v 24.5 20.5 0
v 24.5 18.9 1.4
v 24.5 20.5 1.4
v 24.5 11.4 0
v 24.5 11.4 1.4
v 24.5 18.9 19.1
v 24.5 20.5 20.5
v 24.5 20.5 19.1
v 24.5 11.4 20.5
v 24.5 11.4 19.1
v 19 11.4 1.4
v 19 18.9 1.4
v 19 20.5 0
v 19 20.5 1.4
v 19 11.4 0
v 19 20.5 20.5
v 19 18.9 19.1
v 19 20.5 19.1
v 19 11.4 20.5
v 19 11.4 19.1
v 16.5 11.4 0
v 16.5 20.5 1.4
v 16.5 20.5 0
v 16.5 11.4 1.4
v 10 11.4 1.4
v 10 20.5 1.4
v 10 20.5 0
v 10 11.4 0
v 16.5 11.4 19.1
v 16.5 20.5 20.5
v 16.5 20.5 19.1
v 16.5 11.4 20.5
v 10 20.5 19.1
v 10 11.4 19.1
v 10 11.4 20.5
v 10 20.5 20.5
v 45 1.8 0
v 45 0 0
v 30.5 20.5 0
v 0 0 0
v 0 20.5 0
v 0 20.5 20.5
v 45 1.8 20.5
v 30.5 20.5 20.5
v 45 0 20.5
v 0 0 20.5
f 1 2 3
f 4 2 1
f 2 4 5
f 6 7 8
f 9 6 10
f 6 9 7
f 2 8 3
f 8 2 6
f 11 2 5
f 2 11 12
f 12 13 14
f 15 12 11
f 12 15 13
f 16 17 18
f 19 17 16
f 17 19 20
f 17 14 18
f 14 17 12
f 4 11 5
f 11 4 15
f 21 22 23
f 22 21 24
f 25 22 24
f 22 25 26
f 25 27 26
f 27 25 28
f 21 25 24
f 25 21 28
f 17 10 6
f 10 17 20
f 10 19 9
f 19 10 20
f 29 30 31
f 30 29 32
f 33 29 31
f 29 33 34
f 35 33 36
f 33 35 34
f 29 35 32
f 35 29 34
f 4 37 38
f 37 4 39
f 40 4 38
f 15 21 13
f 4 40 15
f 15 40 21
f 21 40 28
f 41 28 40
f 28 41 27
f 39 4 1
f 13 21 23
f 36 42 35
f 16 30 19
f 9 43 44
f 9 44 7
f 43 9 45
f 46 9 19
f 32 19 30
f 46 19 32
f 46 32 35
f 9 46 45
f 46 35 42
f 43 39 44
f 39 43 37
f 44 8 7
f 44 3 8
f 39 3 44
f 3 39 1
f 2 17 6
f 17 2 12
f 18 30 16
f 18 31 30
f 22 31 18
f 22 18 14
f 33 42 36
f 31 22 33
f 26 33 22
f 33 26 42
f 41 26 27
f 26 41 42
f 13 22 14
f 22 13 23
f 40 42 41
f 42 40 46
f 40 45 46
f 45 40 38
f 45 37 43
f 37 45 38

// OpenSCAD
length = [45,30.5];
width = 20.5;
height = 20.5;
rippe=[6,5.5,1.5,9.2];//dx von vorne, breite Rille dx, breite Rille dy
rippe2=[20.5,6.5,1.5,9.2];//dx von vorne, breite Rille dx, breite Rille dy, tiefe Rille dz
wd = 3;

adafruit_fingerprint_sensor();

module adafruit_fingerprint_sensor()
{
  poly =
    [
    [0,0],
    [length[0],0],
    [length[0],1.8],
    [length[1],height],
    [length[1]-rippe[0],height],
    [length[1]-rippe[0],height-1.6],
    [length[1]-rippe[0]-rippe[1],height-1.6],
    [length[1]-rippe[0]-rippe[1],height],
    [0,height],

    ];
    inlay = rippe[2];
    difference()
    {
      linear_extrude(height=width, convexity=2) polygon(poly);
      union()
      {
        translate([length[1]-rippe[0]-rippe[1],height-rippe[3]+.1,-.1])cube([rippe[1],rippe[3],inlay ]);
        translate([length[1]-rippe2[0],height-rippe2[3]+.1,-.1])cube([rippe2[1],rippe2[3],rippe2[2] ]);
        translate([length[1]-rippe[0]-rippe[1],height-rippe[3]+.1,width-inlay+.1])cube([rippe[1],rippe[3],inlay ]);
        translate([length[1]-rippe2[0],height-rippe2[3]+.1,width-rippe2[2]+.1])cube([rippe2[1],rippe2[3],rippe2[2] ]);
      }
    }
}
